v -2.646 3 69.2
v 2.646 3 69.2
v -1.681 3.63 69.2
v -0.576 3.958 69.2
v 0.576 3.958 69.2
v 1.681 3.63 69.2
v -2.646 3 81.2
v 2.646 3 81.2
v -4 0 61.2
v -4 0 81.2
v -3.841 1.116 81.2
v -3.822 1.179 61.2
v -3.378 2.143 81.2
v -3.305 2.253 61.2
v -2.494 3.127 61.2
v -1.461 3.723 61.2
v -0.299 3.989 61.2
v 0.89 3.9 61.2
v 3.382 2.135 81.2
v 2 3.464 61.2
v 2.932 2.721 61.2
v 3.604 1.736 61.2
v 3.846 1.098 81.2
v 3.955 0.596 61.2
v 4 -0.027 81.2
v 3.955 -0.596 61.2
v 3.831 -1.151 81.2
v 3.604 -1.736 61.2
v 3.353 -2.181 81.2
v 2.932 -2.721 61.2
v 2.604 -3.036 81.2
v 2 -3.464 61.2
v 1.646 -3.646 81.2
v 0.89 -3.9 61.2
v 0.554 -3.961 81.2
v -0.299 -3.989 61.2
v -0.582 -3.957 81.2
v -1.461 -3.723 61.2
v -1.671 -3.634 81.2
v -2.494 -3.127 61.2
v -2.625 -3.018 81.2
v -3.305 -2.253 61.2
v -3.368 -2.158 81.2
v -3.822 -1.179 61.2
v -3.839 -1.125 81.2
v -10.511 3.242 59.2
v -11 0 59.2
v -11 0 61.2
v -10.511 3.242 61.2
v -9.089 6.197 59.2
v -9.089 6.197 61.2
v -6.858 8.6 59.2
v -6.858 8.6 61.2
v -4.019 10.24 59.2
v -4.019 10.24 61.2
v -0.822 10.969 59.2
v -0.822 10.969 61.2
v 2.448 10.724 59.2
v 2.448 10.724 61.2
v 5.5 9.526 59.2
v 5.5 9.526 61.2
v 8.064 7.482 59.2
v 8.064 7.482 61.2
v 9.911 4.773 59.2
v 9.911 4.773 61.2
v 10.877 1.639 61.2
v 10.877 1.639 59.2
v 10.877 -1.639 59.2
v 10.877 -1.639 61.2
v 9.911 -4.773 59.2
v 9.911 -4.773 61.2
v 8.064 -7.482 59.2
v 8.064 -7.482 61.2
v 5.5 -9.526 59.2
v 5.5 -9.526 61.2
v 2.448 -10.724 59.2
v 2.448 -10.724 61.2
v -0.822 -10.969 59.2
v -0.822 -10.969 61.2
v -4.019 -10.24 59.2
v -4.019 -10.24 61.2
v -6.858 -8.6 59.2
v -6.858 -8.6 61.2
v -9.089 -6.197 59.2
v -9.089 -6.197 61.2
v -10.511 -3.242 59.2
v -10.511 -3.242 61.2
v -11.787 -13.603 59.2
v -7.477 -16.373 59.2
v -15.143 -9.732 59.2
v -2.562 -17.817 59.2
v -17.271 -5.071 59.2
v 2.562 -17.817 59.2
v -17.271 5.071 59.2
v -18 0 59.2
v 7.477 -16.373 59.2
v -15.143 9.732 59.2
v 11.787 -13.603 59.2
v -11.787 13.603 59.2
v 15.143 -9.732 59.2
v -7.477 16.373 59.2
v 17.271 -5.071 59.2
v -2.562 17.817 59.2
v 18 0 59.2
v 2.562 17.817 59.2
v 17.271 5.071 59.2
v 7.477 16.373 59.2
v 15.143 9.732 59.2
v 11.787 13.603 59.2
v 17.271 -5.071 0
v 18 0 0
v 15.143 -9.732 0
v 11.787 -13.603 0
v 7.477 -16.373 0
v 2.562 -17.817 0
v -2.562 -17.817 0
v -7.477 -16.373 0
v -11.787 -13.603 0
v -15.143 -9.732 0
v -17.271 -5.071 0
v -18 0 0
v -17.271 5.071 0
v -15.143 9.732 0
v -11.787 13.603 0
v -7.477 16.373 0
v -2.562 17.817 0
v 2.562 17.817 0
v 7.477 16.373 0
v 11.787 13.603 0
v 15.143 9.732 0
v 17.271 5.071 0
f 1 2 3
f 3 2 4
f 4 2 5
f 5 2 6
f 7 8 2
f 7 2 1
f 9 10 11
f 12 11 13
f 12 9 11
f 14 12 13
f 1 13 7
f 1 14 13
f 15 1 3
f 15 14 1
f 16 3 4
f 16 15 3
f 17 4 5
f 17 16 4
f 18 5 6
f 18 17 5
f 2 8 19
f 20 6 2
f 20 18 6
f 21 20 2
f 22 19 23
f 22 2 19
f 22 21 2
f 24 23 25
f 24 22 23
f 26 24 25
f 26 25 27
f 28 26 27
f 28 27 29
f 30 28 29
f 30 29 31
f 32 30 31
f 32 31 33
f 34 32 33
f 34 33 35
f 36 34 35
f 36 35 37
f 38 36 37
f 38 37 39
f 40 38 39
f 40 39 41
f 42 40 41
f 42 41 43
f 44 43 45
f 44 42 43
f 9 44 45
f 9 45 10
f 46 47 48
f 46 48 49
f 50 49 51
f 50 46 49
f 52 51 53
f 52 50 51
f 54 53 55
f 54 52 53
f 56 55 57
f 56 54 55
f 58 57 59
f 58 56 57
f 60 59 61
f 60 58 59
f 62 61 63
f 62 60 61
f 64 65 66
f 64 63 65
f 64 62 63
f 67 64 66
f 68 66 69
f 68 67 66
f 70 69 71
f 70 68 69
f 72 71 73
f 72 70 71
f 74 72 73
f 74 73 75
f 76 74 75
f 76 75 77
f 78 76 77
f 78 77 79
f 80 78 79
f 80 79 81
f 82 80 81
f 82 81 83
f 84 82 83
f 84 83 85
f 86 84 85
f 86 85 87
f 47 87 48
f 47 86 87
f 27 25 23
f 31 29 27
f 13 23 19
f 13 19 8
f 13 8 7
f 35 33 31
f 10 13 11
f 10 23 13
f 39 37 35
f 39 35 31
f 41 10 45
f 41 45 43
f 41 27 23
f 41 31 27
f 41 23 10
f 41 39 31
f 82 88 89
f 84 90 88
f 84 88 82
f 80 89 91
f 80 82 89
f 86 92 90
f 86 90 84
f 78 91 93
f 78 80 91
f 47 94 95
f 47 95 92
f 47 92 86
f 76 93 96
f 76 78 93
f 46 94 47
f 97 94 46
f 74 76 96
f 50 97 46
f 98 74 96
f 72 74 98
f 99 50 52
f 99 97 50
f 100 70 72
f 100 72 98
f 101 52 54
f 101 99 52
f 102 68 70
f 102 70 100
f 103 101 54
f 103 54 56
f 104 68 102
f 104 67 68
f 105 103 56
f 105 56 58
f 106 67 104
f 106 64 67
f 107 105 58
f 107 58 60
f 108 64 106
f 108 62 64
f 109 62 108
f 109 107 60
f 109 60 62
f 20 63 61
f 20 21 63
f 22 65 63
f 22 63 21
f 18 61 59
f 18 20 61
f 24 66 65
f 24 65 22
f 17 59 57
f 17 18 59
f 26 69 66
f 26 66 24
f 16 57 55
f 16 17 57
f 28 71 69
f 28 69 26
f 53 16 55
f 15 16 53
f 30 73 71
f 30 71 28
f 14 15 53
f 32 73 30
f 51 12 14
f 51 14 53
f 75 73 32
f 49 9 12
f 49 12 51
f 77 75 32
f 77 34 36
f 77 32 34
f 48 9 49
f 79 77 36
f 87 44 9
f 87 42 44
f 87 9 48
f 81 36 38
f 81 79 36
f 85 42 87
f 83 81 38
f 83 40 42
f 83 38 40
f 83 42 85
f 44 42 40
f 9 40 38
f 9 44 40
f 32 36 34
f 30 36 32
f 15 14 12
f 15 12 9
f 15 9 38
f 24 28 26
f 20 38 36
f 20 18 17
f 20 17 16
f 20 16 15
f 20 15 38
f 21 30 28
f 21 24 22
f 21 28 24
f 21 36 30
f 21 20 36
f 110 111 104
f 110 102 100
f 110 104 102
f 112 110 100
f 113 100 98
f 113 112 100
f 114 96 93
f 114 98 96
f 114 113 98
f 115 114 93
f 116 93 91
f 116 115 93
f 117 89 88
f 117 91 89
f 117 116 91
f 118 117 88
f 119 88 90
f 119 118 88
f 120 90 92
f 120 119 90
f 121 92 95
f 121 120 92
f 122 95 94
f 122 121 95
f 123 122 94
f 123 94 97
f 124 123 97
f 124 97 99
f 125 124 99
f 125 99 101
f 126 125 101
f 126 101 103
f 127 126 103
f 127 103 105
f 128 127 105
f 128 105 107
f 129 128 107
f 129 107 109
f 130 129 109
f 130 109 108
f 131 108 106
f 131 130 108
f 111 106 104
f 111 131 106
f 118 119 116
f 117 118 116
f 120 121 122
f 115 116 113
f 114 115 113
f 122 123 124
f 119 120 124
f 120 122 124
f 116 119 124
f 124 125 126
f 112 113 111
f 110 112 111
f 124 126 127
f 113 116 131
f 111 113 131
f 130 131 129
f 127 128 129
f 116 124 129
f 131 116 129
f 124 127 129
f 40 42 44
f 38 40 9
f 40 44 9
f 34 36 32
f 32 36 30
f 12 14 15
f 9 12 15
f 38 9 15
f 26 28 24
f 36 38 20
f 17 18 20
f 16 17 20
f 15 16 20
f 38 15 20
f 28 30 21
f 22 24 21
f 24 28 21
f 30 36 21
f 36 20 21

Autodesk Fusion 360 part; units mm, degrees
sketch "スケッチ1" plane through (0, 0, 0) normal (0, 0, 1) x (1, 0, 0)
  circle A0 centre (0, 0) radius 18
  dimension "d1" = 36
extrude "押し出し1" add sketch "スケッチ1" along normal blind 59.2 makes body 1
sketch "スケッチ2" plane through (0, 0, 59.2) normal (0, 0, 1) x (-1, 0, 0)
  circle A0 centre (0, 0) radius 18
  circle A1 centre (0, 0) radius 11
  dimension "d4" = 22
extrude "押し出し2" add sketch "スケッチ2" along normal blind 2 contours A1 bodies 1
sketch "スケッチ3" plane through (0, 0, 61.2) normal (0, 0, 1) x (-1, 0, 0)
  circle A0 centre (0, 0) radius 11
  circle A1 centre (0, 0) radius 4
  dimension "d7" = 8
extrude "押し出し3" add sketch "スケッチ3" along normal blind 20 contours A1 bodies 1
sketch "スケッチ4" plane through (0, 0, 81.2) normal (0, 0, 1) x (-1, 0, 0)
  circle A0 centre (0, 0) radius 4
  line L0 (0, 4) -> (0, -3)
  line L1 (0, -3) -> (-2.6458, -3)
  line L2 (0, -3) -> (0.3268, -3)
  line L3 (0.3268, -3) -> (2.6458, -3)
  dimension "d10" = 7
extrude "押し出し4" cut sketch "スケッチ4" against normal blind 12 contours A0 L1 L2 L3 bodies 1
split "分割1" by plane through (0, 0, 61.2) normal (0, 0, 1) bodies 1 makes body 2 at (3.1047, 2.5221, 67.8667)
copy_body "ボディ -> コンポーネント1" bodies 1 removing the originals makes body 3 in component "Component"
copy_body "ボディ -> コンポーネント2" bodies 2 removing the originals makes body 4 in component "Component'"
component "Component" placed x (1, 0, 0) y (0, 1, 0) z (0, 0, 1) at (0, 0, 0)
component "Component'" placed x (1, 0, 0) y (0, 1, 0) z (0, 0, 1) at (0, 0, 0)
